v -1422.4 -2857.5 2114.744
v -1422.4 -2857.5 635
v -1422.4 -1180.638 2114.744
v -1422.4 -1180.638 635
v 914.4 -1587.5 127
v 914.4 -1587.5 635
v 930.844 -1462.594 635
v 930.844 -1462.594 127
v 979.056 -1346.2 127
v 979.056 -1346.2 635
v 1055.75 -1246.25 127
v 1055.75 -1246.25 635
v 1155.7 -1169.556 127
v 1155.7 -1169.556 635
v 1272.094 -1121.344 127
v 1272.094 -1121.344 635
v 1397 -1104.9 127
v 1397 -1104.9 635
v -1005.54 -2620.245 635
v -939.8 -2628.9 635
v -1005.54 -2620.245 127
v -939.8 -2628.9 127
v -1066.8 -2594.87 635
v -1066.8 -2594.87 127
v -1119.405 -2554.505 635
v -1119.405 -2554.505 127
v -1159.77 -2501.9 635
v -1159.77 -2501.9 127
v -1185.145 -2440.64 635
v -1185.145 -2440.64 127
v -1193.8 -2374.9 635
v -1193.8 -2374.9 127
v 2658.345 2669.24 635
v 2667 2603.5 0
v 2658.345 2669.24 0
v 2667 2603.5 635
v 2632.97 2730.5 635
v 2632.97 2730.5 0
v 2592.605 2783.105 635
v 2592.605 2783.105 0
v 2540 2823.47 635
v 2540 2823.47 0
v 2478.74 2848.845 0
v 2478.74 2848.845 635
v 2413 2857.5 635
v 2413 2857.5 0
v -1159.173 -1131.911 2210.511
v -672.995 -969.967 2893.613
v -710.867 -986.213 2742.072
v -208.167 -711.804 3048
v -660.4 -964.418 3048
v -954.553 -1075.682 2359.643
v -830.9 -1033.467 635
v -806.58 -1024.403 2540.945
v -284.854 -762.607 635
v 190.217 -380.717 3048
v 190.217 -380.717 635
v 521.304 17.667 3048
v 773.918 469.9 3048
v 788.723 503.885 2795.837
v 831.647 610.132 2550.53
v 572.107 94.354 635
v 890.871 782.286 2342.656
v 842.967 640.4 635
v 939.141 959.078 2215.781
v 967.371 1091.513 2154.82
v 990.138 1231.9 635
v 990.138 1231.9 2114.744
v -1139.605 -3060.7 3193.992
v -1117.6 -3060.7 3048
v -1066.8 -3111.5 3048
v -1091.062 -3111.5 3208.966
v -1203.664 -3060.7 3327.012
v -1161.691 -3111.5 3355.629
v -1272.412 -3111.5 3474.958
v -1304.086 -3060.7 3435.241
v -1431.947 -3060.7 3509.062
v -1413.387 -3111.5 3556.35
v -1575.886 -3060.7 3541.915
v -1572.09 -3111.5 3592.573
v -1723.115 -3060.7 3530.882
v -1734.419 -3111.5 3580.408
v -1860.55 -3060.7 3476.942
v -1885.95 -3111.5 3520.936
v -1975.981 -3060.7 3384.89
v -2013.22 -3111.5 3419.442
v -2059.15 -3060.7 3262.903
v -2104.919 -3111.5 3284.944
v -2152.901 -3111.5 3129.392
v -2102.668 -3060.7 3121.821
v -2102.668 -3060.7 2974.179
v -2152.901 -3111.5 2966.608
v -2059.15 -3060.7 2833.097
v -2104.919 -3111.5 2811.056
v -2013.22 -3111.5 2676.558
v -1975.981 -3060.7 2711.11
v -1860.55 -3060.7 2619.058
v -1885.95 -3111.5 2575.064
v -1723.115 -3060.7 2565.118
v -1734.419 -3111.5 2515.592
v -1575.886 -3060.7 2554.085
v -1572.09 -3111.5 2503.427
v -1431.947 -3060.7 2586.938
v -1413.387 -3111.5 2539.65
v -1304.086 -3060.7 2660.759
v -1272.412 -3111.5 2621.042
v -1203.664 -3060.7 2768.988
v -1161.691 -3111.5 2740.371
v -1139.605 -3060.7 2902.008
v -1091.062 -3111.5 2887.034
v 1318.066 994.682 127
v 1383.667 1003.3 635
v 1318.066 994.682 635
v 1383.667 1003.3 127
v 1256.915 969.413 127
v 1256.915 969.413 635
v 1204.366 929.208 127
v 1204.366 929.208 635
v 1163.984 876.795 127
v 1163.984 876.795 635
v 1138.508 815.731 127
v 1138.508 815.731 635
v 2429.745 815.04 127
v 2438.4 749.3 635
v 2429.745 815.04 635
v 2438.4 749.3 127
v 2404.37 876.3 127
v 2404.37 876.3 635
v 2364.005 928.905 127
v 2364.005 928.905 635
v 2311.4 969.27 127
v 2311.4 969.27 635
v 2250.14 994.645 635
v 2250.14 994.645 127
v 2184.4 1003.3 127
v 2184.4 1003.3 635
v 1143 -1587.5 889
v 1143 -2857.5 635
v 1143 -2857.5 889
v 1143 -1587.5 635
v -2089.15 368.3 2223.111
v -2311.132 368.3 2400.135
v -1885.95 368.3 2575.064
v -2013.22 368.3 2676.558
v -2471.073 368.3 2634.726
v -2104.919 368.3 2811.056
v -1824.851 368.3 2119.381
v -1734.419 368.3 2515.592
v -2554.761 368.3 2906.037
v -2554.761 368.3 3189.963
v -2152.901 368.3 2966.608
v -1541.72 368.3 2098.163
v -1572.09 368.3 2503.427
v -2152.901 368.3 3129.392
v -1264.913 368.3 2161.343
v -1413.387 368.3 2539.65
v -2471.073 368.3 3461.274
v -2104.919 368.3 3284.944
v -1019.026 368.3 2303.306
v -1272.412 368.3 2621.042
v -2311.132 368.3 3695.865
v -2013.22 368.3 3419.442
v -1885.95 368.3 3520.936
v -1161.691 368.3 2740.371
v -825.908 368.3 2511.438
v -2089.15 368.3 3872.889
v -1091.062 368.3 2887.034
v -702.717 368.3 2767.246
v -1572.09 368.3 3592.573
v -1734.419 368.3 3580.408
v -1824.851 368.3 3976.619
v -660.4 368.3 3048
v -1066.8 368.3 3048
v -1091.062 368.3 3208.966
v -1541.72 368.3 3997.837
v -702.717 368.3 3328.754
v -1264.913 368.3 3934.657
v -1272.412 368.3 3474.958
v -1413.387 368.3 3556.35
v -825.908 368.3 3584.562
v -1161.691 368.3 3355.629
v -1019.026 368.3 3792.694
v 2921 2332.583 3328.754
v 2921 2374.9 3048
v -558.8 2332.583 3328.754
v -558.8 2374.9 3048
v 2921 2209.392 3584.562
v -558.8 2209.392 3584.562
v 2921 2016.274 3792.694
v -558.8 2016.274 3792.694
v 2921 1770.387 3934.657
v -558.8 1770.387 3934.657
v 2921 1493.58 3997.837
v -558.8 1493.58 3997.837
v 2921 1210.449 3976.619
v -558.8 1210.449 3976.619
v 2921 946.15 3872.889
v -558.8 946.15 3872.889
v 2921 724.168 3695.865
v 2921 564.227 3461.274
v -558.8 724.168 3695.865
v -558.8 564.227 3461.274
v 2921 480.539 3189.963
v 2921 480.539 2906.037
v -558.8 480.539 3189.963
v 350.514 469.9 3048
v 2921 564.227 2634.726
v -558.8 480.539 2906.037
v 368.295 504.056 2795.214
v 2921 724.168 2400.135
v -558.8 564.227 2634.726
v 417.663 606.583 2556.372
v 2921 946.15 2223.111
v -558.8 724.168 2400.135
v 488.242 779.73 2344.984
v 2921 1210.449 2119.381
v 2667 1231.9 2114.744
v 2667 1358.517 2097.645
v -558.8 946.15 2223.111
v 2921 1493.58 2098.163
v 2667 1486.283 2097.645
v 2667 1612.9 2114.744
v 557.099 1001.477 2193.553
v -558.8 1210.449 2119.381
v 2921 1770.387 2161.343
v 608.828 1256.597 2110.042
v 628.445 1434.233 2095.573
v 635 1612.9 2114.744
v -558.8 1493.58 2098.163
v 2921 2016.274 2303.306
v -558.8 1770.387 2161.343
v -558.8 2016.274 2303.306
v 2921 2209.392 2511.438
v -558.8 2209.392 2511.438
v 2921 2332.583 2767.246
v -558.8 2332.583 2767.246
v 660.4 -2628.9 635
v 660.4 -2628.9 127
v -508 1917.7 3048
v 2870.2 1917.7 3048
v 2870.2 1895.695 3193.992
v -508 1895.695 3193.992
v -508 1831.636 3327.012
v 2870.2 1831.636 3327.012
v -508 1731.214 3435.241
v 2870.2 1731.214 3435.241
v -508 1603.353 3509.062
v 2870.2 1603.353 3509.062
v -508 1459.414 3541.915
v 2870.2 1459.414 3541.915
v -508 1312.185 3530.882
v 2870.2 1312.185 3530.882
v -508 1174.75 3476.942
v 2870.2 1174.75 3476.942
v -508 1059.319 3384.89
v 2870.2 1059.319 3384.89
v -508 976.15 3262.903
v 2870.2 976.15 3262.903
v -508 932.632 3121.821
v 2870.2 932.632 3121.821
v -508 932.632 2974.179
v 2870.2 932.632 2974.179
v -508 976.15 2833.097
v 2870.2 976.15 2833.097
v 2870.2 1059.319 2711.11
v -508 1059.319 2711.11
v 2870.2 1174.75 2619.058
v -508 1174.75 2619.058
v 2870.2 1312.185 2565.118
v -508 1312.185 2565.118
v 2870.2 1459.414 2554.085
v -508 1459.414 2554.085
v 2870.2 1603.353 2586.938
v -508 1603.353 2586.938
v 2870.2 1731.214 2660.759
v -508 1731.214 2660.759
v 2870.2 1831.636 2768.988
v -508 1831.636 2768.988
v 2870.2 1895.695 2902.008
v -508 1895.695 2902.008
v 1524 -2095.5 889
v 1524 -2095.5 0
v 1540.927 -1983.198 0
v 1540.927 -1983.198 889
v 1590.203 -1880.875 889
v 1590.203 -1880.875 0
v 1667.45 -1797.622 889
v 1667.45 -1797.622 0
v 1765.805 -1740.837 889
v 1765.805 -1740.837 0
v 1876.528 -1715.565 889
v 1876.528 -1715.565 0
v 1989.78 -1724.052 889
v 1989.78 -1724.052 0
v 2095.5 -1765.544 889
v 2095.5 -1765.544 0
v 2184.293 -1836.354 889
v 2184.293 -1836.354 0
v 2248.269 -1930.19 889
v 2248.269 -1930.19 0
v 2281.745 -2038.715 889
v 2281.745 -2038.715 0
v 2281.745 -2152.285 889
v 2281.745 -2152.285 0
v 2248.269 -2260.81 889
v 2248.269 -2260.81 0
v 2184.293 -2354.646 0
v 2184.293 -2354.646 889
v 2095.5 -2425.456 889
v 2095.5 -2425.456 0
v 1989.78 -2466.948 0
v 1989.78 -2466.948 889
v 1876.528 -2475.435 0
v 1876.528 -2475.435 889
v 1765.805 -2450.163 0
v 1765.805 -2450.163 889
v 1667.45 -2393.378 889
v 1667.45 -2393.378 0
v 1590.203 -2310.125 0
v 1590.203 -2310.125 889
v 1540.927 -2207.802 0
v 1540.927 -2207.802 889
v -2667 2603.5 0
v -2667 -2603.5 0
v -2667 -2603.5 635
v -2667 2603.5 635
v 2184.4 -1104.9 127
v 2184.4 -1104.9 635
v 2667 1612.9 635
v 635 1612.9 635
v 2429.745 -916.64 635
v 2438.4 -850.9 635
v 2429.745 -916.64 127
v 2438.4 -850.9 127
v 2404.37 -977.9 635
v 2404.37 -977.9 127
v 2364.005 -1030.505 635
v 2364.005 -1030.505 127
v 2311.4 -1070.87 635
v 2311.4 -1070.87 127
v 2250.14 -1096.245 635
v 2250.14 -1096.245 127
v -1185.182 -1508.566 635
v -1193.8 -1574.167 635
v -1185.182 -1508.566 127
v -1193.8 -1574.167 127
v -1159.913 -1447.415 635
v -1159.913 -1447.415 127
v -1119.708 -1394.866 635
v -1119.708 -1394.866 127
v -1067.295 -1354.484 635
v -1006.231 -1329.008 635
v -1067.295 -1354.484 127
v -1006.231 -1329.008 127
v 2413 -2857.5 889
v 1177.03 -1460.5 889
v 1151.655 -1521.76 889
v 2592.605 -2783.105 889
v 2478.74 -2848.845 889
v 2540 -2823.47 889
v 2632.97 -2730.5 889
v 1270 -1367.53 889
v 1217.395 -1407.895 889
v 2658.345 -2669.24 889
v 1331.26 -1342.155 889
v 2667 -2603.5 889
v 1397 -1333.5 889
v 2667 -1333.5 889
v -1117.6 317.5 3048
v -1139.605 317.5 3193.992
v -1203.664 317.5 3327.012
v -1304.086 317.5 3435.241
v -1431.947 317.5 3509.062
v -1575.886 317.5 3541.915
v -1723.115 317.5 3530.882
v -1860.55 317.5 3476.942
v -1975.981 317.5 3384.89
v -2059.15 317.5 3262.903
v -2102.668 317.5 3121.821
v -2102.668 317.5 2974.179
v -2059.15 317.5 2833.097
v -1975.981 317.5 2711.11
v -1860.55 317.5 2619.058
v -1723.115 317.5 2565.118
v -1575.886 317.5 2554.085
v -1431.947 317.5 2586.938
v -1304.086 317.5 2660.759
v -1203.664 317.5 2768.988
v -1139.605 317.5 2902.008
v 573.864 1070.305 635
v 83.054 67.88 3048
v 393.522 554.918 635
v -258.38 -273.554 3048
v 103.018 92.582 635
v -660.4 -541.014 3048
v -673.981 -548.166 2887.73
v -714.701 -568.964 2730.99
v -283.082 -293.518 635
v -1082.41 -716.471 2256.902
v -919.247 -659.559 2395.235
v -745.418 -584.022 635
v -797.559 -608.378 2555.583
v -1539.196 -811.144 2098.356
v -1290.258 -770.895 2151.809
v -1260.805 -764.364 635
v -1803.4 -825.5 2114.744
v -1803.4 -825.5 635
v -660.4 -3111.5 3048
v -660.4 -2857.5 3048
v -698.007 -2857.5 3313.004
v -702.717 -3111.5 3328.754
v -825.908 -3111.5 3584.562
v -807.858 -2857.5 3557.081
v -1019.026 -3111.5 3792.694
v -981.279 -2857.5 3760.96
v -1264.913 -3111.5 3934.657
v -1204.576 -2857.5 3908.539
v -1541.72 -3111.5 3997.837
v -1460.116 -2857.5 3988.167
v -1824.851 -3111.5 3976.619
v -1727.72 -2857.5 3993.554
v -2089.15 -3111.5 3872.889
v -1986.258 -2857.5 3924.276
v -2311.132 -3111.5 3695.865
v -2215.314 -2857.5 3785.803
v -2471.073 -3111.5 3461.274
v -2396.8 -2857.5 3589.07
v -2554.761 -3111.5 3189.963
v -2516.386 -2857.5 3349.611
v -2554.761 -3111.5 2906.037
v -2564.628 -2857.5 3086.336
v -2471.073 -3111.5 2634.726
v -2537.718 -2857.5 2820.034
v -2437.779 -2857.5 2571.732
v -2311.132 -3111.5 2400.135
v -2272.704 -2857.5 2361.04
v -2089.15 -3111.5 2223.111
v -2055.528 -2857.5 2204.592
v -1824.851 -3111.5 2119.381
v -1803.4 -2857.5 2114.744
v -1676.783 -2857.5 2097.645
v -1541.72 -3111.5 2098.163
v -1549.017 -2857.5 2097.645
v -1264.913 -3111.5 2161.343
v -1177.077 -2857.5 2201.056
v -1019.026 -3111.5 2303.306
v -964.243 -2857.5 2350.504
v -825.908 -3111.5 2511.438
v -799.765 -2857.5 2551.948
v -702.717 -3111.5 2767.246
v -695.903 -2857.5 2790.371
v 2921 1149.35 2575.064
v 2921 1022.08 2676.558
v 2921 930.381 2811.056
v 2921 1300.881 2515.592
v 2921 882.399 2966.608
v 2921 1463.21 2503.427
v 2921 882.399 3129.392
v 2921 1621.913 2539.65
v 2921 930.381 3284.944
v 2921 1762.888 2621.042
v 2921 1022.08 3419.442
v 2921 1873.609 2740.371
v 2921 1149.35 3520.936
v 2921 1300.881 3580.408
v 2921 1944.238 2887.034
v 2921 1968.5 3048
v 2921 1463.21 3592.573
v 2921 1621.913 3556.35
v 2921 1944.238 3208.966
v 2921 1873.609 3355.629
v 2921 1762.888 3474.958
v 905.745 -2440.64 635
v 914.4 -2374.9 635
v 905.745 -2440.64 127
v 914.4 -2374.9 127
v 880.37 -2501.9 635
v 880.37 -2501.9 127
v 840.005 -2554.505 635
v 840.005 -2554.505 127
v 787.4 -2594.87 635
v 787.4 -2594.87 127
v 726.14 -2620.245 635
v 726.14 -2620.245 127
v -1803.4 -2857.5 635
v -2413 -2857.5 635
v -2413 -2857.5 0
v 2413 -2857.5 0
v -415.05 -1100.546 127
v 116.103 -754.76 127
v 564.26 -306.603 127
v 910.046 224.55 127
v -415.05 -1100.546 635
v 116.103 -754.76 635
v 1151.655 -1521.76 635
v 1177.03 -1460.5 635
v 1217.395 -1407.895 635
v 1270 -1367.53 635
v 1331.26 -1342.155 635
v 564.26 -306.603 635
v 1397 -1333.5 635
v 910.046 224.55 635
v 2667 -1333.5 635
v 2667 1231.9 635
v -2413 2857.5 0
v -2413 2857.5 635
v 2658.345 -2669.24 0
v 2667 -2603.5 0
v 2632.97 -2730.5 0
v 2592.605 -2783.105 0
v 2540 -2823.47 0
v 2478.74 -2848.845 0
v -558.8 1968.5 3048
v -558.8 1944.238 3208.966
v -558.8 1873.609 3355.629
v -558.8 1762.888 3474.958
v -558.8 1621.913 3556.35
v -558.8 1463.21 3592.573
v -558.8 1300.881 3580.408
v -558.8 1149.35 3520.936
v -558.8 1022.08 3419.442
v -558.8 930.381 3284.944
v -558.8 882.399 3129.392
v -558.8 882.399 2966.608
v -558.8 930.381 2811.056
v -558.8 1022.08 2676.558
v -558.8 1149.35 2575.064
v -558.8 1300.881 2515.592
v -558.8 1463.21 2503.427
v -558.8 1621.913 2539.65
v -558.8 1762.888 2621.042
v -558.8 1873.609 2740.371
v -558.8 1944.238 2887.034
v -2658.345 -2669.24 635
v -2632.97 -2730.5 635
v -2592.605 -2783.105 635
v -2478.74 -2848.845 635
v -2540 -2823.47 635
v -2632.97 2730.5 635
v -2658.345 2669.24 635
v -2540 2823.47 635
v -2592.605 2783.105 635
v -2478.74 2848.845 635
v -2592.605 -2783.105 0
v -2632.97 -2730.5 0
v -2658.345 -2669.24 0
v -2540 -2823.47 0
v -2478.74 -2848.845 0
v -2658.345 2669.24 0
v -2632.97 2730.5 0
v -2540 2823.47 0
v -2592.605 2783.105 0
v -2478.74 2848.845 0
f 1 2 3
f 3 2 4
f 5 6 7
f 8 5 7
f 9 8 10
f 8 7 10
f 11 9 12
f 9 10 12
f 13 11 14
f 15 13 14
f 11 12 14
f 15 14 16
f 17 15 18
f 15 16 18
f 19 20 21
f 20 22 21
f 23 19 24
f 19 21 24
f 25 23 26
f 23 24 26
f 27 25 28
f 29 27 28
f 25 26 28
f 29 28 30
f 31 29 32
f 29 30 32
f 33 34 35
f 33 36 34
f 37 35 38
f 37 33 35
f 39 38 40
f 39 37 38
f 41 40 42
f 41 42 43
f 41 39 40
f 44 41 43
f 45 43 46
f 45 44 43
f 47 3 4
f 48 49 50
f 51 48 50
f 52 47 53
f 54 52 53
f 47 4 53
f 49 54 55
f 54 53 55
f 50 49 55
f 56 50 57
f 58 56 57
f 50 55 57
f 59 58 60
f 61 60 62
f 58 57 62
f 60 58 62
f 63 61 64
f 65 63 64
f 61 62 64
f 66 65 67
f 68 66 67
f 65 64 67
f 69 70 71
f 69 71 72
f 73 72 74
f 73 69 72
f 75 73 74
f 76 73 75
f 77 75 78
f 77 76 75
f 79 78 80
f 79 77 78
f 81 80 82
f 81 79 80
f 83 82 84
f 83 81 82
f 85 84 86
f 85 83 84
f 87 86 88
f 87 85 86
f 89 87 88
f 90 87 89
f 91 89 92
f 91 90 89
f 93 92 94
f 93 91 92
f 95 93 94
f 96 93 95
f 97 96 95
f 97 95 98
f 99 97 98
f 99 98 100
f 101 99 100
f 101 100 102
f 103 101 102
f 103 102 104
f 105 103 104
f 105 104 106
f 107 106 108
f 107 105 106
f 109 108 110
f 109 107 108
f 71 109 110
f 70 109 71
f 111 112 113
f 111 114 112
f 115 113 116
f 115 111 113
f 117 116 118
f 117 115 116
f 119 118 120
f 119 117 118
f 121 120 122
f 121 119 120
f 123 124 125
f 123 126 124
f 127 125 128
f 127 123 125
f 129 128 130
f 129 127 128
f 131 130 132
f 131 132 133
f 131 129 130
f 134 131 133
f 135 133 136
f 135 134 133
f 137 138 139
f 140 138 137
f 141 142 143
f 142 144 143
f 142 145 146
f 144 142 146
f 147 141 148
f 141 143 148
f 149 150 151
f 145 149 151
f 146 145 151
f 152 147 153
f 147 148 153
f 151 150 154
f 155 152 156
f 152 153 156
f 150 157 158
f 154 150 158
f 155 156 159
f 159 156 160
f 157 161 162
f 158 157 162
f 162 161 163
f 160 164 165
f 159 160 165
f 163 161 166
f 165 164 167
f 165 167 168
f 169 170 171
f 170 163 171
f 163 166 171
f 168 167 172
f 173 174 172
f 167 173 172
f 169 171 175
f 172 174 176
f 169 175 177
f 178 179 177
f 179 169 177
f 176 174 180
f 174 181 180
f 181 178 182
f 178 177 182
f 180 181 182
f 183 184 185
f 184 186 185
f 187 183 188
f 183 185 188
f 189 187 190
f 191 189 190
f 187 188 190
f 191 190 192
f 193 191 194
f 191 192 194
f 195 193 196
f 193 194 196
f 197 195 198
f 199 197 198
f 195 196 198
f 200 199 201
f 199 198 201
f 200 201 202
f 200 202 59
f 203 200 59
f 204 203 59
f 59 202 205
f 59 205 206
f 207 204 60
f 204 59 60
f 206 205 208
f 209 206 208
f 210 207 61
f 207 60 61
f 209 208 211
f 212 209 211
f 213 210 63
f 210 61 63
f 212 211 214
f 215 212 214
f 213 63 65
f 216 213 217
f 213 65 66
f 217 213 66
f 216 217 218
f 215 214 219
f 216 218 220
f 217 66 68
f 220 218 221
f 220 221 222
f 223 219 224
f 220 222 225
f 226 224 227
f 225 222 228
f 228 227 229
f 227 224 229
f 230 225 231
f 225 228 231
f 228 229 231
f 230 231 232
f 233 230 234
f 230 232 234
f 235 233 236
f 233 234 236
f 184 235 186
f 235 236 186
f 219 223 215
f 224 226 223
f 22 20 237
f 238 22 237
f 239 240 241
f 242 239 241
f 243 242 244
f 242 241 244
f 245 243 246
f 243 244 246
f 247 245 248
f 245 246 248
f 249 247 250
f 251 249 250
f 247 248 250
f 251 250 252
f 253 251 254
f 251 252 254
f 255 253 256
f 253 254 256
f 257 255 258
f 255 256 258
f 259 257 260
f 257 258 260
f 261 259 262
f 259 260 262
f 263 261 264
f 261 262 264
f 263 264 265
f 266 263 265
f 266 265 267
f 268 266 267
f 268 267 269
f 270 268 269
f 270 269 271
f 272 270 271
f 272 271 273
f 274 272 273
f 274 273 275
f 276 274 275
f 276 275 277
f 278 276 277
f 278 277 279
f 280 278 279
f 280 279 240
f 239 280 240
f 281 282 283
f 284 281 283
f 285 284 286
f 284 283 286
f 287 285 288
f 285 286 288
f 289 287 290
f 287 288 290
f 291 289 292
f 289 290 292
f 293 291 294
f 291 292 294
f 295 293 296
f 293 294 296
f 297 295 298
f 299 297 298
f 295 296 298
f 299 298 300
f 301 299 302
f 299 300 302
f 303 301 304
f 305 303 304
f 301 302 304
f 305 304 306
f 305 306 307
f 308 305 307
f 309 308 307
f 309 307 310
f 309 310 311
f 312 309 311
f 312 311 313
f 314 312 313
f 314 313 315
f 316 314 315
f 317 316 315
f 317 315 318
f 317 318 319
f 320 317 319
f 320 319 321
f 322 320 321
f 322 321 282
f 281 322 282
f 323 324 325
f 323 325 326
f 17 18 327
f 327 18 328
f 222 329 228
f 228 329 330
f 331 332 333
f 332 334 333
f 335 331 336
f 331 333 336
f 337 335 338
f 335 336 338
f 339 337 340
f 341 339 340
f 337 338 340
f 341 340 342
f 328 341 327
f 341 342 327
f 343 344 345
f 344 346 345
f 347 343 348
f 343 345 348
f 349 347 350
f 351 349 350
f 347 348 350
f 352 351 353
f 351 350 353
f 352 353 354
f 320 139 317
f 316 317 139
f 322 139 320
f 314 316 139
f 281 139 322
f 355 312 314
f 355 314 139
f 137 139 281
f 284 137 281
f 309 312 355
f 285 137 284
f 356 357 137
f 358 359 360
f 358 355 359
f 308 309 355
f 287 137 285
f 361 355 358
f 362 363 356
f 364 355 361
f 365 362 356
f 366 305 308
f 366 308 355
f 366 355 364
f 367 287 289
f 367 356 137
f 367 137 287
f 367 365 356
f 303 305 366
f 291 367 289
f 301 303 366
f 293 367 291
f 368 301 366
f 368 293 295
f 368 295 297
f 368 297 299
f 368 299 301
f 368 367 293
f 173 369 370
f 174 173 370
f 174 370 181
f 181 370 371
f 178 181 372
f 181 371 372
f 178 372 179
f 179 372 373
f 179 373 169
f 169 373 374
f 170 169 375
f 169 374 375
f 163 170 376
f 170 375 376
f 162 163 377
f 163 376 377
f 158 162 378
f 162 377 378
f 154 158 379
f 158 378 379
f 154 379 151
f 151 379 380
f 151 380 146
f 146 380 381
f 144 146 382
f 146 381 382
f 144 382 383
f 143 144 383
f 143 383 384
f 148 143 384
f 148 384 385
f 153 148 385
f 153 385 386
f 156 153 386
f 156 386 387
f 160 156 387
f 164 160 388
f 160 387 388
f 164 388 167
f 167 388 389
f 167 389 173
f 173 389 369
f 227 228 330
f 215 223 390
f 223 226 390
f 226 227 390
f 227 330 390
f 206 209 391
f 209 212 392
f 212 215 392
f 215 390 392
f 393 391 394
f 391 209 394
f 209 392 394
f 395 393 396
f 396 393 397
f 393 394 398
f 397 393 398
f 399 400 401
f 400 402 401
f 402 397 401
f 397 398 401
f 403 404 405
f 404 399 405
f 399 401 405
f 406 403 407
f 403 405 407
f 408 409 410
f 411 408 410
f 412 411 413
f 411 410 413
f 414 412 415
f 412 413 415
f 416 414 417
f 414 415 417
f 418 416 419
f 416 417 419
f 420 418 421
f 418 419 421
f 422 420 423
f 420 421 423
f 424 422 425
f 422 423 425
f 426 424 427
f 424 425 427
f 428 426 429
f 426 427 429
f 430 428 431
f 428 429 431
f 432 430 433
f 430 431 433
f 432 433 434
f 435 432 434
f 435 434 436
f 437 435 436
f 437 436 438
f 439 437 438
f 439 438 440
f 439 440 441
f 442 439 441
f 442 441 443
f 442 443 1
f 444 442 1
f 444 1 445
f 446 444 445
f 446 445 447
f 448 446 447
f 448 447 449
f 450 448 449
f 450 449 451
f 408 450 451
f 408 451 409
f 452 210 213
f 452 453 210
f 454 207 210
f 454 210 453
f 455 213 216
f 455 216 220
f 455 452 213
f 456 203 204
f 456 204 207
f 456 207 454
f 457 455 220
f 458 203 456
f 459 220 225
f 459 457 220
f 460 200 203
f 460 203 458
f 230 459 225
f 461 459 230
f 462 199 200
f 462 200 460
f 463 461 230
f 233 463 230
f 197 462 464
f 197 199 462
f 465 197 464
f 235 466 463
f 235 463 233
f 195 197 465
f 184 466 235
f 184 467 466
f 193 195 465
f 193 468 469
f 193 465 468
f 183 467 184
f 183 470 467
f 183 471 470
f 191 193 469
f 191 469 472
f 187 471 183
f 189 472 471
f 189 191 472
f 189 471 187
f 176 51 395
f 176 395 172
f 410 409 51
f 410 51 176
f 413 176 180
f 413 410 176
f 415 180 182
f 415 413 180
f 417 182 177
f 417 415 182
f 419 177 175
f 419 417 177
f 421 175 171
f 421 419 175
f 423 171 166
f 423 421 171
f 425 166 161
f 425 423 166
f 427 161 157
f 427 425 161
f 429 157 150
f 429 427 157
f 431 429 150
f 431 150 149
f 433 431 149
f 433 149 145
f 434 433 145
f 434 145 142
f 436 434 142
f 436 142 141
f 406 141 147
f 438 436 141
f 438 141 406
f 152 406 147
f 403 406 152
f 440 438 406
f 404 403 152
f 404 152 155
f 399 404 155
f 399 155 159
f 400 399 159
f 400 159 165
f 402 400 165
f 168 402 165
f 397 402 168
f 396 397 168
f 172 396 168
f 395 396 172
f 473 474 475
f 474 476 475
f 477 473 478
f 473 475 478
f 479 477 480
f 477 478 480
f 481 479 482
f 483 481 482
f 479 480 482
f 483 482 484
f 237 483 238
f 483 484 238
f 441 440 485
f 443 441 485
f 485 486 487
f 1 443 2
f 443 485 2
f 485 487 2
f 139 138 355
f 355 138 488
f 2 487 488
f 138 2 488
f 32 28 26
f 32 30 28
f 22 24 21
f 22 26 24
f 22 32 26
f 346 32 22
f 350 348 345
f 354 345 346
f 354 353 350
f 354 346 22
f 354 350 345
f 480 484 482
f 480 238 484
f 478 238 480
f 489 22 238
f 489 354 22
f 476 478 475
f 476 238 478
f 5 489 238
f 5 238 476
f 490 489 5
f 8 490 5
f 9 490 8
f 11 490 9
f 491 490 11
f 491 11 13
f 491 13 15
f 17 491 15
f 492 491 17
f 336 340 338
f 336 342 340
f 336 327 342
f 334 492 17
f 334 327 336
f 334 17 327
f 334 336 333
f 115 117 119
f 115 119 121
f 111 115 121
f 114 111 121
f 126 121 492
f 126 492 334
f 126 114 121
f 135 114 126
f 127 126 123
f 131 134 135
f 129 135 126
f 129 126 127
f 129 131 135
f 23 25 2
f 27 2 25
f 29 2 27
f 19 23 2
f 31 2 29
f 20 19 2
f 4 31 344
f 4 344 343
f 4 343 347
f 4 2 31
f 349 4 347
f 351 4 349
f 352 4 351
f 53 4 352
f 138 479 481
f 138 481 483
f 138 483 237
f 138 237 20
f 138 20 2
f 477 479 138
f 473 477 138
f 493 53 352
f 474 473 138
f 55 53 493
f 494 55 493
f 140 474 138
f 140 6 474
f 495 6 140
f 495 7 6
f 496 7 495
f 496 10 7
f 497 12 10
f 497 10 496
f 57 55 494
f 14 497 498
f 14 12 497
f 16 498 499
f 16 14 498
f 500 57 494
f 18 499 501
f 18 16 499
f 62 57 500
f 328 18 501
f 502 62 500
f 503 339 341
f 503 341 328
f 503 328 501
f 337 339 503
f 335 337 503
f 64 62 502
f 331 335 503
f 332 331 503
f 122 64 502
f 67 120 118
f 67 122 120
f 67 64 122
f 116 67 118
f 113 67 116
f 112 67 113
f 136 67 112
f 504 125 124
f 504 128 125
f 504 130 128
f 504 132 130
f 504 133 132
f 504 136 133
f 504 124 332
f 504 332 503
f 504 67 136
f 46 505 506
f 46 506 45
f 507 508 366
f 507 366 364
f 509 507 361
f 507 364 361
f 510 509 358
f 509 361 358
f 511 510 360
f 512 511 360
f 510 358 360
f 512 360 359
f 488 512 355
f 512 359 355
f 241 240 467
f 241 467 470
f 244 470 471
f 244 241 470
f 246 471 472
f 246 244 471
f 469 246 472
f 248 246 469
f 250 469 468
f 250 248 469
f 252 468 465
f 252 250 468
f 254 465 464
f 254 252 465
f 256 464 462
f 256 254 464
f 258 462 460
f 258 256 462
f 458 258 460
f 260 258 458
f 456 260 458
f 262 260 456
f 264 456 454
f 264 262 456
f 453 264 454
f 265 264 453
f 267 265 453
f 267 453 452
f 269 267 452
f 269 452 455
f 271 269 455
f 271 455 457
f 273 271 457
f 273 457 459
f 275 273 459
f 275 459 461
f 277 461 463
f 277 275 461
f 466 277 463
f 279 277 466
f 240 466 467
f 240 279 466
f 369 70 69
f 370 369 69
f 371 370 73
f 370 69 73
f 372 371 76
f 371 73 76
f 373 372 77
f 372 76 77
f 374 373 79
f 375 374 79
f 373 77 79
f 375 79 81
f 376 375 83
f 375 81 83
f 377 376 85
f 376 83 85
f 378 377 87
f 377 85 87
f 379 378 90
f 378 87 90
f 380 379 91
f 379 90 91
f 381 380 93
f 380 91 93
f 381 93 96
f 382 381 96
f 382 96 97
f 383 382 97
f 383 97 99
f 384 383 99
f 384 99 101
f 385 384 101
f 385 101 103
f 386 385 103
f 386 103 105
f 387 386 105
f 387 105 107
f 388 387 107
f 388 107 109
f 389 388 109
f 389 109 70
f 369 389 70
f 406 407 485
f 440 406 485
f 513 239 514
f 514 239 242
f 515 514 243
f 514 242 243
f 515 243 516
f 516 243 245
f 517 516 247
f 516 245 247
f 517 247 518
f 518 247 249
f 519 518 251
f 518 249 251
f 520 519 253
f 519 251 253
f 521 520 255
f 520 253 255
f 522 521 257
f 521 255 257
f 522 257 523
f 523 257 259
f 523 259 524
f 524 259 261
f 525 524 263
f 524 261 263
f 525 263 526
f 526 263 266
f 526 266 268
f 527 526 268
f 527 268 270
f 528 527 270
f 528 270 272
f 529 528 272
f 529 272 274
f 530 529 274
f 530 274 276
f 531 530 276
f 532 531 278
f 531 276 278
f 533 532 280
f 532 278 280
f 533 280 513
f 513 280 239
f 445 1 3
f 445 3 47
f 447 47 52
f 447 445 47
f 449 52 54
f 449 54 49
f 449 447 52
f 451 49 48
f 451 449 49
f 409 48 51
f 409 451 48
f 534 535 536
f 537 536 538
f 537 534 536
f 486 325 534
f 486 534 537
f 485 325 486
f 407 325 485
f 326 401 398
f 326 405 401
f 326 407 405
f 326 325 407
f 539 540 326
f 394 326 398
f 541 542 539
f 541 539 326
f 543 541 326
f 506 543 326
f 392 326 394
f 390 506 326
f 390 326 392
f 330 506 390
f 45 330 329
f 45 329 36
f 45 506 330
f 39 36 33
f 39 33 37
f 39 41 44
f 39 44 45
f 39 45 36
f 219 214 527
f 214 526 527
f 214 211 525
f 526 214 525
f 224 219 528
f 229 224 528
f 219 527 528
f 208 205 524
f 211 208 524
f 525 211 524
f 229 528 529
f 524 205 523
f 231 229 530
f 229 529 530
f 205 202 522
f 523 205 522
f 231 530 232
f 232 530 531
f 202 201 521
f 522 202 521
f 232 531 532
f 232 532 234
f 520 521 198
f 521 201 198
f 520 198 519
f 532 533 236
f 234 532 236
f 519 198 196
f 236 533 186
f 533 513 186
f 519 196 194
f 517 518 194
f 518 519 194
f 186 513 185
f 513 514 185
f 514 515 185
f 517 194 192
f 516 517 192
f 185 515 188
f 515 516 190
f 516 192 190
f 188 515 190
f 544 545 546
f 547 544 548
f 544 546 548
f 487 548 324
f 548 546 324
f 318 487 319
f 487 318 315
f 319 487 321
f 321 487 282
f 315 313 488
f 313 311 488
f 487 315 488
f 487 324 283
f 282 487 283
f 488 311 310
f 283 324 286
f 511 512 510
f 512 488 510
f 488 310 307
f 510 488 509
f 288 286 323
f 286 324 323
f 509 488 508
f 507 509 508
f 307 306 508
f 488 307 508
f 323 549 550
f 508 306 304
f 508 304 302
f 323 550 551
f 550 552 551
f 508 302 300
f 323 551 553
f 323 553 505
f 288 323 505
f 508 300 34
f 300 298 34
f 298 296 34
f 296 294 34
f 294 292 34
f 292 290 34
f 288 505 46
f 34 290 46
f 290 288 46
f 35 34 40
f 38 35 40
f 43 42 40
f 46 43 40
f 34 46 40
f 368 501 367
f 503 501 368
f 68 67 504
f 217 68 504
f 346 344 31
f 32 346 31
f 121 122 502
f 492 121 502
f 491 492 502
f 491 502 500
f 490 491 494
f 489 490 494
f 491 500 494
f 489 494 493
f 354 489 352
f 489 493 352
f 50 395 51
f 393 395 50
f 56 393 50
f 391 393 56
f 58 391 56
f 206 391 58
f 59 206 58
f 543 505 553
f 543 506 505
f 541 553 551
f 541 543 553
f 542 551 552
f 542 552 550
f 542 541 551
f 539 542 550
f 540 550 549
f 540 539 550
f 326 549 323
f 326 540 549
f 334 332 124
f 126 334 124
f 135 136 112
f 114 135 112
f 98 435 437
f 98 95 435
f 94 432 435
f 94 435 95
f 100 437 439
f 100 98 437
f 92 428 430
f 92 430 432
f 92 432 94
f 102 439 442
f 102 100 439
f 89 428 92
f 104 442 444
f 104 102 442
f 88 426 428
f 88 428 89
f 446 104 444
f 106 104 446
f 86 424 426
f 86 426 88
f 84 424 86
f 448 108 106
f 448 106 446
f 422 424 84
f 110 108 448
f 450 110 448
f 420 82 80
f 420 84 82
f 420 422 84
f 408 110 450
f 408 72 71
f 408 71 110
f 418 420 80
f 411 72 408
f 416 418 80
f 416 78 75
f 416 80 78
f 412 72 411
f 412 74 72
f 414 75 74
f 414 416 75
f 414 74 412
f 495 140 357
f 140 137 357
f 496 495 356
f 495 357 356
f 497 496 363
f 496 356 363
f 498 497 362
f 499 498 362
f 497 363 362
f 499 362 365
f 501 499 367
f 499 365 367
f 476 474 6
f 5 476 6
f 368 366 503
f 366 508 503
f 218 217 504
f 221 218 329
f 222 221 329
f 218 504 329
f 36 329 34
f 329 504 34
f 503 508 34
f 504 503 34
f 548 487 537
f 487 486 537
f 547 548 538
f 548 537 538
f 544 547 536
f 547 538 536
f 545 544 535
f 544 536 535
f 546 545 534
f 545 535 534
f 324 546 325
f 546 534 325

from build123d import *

# Parameters (mm, degrees)
F0_W            = 5334
F0_H            = 5715
F1_DEPTH        = 635
F3_DEPTH        = 2413
F4_R            = 952.5
F5_DEPTH        = 254
F5_DEPTH_BACK   = 3225.8
F6_R            = 952.5
F7_DEPTH        = 254
F7_DEPTH_BACK   = 3225.8
F8_W            = 1524
F8_H            = 1524
F9_DEPTH        = 254
F10_R           = 254
F12_DEPTH       = 508
F14_D           = 762
F14_CBORE_D     = 762
F14_CBORE_DEPTH = 254
F15_R           = 254
F16_R           = 254
F17_R           = 495.3
F18_DEPTH       = 5969.001
F19_R           = 495.3
F20_DEPTH       = 5588.001
F21_SIZE        = 50.8
F22_R           = 254


with BuildPart() as f1:
    # F0 (on Top) → F1 (new body)
    with BuildSketch(Plane.XY):
        Rectangle(F0_W, F0_H)
    extrude(amount=F1_DEPTH)

    # F2 (on face) → F3 (join)
    with BuildSketch(Plane.XY.offset(635)):
        with BuildLine():
            Line((-1803.4, -825.5), (-1803.4, -2857.5))
            Line((-1803.4, -2857.5), (-1422.4, -2857.5))
            Line((-1422.4, -2857.5), (-1422.4, -1180.638144))
            ThreePointArc((-1422.4, -1180.638144), (190.216859, -380.716859), (990.138144, 1231.9))
            Line((990.138144, 1231.9), (2667, 1231.9))
            Line((2667, 1231.9), (2667, 1612.9))
            Line((2667, 1612.9), (635, 1612.9))
            ThreePointArc((635, 1612.9), (-79.190825, -111.309175), (-1803.4, -825.5))
        make_face()
    extrude(amount=F3_DEPTH)

    # F4 (on face) → F5 (join, two sides)
    with BuildSketch(Plane.XZ.offset(2857.5)) as f5_sk:
        with Locations((-1612.9, 3048)):
            Circle(F4_R)
    extrude(amount=F5_DEPTH)
    extrude(f5_sk.sketch, amount=-F5_DEPTH_BACK)

    # F6 (on face) → F7 (join, two sides)
    with BuildSketch(Plane.YZ.offset(2667)) as f7_sk:
        with Locations((1422.4, 3048)):
            Circle(F6_R)
    extrude(amount=F7_DEPTH)
    extrude(f7_sk.sketch, amount=-F7_DEPTH_BACK)

    # F8 (on face) → F9 (join)
    with BuildSketch(Plane.XY.offset(635)):
        with Locations((1905, -2095.5)):
            Rectangle(F8_W, F8_H)
    extrude(amount=F9_DEPTH)

    # F10
    f10_edges = [f1.edges().sort_by_distance(p)[0] for p in [
        (1143, -1333.5, 762),
    ]]
    fillet(f10_edges, radius=F10_R)

    # F11 (on face) → F12 (cut)
    with BuildSketch(Plane.XY.offset(635)):
        with BuildLine():
            ThreePointArc((1183.017894, 1003.3), (351.861469, -542.361469), (-1193.8, -1373.517894))
            Line((-1193.8, -1373.517894), (-1193.8, -2628.9))
            Line((-1193.8, -2628.9), (914.4, -2628.9))
            Line((914.4, -2628.9), (914.4, -1587.5))
            ThreePointArc((914.4, -1587.5), (1055.750267, -1246.250267), (1397, -1104.9))
            Line((1397, -1104.9), (2438.4, -1104.9))
            Line((2438.4, -1104.9), (2438.4, 1003.3))
            Line((2438.4, 1003.3), (1183.017894, 1003.3))
        make_face()
    extrude(amount=-F12_DEPTH, mode=Mode.SUBTRACT)

    # F14 (through all)
    with Locations(Plane.XY.offset(889)):
        with Locations((1905, -2095.5)):
            CounterBoreHole(F14_D / 2, F14_CBORE_D / 2, F14_CBORE_DEPTH)

    # F15
    f15_edges = [f1.edges().sort_by_distance(p)[0] for p in [
        (-1193.8, -1373.517894, 381),
        (1183.017894, 1003.3, 381),
        (-1193.8, -2628.9, 381),
        (2438.4, -1104.9, 381),
        (914.4, -2628.9, 381),
    ]]
    fillet(f15_edges, radius=F15_R)

    # F16
    f16_edges = [f1.edges().sort_by_distance(p)[0] for p in [
        (2438.4, 1003.3, 381),
    ]]
    fillet(f16_edges, radius=F16_R)

    # F17 (on face) → F18 (cut, through all)
    with BuildSketch(Plane.XZ.offset(3111.5)):
        with Locations((-1612.9, 3048)):
            Circle(F17_R)
    extrude(amount=-F18_DEPTH, mode=Mode.SUBTRACT)

    # F19 (on face) → F20 (cut, through all)
    with BuildSketch(Plane.YZ.offset(2921)):
        with Locations((1422.4, 3048)):
            Circle(F19_R)
    extrude(amount=-F20_DEPTH, mode=Mode.SUBTRACT)

    # F21
    f21_edges = [f1.edges().sort_by_distance(p)[0] for p in [
        (-2108.2, -3111.5, 3048),
        (2921, 927.1, 3048),
        (-2108.2, 368.3, 3048),
        (-558.8, 927.1, 3048),
    ]]
    chamfer(f21_edges, length=F21_SIZE)

    # F22
    f22_edges = [f1.edges().sort_by_distance(p)[0] for p in [
        (-2667, -2857.5, 317.5),
        (2667, -2857.5, 444.5),
        (2667, 2857.5, 317.5),
        (-2667, 2857.5, 317.5),
    ]]
    fillet(f22_edges, radius=F22_R)


solid = f1.part
